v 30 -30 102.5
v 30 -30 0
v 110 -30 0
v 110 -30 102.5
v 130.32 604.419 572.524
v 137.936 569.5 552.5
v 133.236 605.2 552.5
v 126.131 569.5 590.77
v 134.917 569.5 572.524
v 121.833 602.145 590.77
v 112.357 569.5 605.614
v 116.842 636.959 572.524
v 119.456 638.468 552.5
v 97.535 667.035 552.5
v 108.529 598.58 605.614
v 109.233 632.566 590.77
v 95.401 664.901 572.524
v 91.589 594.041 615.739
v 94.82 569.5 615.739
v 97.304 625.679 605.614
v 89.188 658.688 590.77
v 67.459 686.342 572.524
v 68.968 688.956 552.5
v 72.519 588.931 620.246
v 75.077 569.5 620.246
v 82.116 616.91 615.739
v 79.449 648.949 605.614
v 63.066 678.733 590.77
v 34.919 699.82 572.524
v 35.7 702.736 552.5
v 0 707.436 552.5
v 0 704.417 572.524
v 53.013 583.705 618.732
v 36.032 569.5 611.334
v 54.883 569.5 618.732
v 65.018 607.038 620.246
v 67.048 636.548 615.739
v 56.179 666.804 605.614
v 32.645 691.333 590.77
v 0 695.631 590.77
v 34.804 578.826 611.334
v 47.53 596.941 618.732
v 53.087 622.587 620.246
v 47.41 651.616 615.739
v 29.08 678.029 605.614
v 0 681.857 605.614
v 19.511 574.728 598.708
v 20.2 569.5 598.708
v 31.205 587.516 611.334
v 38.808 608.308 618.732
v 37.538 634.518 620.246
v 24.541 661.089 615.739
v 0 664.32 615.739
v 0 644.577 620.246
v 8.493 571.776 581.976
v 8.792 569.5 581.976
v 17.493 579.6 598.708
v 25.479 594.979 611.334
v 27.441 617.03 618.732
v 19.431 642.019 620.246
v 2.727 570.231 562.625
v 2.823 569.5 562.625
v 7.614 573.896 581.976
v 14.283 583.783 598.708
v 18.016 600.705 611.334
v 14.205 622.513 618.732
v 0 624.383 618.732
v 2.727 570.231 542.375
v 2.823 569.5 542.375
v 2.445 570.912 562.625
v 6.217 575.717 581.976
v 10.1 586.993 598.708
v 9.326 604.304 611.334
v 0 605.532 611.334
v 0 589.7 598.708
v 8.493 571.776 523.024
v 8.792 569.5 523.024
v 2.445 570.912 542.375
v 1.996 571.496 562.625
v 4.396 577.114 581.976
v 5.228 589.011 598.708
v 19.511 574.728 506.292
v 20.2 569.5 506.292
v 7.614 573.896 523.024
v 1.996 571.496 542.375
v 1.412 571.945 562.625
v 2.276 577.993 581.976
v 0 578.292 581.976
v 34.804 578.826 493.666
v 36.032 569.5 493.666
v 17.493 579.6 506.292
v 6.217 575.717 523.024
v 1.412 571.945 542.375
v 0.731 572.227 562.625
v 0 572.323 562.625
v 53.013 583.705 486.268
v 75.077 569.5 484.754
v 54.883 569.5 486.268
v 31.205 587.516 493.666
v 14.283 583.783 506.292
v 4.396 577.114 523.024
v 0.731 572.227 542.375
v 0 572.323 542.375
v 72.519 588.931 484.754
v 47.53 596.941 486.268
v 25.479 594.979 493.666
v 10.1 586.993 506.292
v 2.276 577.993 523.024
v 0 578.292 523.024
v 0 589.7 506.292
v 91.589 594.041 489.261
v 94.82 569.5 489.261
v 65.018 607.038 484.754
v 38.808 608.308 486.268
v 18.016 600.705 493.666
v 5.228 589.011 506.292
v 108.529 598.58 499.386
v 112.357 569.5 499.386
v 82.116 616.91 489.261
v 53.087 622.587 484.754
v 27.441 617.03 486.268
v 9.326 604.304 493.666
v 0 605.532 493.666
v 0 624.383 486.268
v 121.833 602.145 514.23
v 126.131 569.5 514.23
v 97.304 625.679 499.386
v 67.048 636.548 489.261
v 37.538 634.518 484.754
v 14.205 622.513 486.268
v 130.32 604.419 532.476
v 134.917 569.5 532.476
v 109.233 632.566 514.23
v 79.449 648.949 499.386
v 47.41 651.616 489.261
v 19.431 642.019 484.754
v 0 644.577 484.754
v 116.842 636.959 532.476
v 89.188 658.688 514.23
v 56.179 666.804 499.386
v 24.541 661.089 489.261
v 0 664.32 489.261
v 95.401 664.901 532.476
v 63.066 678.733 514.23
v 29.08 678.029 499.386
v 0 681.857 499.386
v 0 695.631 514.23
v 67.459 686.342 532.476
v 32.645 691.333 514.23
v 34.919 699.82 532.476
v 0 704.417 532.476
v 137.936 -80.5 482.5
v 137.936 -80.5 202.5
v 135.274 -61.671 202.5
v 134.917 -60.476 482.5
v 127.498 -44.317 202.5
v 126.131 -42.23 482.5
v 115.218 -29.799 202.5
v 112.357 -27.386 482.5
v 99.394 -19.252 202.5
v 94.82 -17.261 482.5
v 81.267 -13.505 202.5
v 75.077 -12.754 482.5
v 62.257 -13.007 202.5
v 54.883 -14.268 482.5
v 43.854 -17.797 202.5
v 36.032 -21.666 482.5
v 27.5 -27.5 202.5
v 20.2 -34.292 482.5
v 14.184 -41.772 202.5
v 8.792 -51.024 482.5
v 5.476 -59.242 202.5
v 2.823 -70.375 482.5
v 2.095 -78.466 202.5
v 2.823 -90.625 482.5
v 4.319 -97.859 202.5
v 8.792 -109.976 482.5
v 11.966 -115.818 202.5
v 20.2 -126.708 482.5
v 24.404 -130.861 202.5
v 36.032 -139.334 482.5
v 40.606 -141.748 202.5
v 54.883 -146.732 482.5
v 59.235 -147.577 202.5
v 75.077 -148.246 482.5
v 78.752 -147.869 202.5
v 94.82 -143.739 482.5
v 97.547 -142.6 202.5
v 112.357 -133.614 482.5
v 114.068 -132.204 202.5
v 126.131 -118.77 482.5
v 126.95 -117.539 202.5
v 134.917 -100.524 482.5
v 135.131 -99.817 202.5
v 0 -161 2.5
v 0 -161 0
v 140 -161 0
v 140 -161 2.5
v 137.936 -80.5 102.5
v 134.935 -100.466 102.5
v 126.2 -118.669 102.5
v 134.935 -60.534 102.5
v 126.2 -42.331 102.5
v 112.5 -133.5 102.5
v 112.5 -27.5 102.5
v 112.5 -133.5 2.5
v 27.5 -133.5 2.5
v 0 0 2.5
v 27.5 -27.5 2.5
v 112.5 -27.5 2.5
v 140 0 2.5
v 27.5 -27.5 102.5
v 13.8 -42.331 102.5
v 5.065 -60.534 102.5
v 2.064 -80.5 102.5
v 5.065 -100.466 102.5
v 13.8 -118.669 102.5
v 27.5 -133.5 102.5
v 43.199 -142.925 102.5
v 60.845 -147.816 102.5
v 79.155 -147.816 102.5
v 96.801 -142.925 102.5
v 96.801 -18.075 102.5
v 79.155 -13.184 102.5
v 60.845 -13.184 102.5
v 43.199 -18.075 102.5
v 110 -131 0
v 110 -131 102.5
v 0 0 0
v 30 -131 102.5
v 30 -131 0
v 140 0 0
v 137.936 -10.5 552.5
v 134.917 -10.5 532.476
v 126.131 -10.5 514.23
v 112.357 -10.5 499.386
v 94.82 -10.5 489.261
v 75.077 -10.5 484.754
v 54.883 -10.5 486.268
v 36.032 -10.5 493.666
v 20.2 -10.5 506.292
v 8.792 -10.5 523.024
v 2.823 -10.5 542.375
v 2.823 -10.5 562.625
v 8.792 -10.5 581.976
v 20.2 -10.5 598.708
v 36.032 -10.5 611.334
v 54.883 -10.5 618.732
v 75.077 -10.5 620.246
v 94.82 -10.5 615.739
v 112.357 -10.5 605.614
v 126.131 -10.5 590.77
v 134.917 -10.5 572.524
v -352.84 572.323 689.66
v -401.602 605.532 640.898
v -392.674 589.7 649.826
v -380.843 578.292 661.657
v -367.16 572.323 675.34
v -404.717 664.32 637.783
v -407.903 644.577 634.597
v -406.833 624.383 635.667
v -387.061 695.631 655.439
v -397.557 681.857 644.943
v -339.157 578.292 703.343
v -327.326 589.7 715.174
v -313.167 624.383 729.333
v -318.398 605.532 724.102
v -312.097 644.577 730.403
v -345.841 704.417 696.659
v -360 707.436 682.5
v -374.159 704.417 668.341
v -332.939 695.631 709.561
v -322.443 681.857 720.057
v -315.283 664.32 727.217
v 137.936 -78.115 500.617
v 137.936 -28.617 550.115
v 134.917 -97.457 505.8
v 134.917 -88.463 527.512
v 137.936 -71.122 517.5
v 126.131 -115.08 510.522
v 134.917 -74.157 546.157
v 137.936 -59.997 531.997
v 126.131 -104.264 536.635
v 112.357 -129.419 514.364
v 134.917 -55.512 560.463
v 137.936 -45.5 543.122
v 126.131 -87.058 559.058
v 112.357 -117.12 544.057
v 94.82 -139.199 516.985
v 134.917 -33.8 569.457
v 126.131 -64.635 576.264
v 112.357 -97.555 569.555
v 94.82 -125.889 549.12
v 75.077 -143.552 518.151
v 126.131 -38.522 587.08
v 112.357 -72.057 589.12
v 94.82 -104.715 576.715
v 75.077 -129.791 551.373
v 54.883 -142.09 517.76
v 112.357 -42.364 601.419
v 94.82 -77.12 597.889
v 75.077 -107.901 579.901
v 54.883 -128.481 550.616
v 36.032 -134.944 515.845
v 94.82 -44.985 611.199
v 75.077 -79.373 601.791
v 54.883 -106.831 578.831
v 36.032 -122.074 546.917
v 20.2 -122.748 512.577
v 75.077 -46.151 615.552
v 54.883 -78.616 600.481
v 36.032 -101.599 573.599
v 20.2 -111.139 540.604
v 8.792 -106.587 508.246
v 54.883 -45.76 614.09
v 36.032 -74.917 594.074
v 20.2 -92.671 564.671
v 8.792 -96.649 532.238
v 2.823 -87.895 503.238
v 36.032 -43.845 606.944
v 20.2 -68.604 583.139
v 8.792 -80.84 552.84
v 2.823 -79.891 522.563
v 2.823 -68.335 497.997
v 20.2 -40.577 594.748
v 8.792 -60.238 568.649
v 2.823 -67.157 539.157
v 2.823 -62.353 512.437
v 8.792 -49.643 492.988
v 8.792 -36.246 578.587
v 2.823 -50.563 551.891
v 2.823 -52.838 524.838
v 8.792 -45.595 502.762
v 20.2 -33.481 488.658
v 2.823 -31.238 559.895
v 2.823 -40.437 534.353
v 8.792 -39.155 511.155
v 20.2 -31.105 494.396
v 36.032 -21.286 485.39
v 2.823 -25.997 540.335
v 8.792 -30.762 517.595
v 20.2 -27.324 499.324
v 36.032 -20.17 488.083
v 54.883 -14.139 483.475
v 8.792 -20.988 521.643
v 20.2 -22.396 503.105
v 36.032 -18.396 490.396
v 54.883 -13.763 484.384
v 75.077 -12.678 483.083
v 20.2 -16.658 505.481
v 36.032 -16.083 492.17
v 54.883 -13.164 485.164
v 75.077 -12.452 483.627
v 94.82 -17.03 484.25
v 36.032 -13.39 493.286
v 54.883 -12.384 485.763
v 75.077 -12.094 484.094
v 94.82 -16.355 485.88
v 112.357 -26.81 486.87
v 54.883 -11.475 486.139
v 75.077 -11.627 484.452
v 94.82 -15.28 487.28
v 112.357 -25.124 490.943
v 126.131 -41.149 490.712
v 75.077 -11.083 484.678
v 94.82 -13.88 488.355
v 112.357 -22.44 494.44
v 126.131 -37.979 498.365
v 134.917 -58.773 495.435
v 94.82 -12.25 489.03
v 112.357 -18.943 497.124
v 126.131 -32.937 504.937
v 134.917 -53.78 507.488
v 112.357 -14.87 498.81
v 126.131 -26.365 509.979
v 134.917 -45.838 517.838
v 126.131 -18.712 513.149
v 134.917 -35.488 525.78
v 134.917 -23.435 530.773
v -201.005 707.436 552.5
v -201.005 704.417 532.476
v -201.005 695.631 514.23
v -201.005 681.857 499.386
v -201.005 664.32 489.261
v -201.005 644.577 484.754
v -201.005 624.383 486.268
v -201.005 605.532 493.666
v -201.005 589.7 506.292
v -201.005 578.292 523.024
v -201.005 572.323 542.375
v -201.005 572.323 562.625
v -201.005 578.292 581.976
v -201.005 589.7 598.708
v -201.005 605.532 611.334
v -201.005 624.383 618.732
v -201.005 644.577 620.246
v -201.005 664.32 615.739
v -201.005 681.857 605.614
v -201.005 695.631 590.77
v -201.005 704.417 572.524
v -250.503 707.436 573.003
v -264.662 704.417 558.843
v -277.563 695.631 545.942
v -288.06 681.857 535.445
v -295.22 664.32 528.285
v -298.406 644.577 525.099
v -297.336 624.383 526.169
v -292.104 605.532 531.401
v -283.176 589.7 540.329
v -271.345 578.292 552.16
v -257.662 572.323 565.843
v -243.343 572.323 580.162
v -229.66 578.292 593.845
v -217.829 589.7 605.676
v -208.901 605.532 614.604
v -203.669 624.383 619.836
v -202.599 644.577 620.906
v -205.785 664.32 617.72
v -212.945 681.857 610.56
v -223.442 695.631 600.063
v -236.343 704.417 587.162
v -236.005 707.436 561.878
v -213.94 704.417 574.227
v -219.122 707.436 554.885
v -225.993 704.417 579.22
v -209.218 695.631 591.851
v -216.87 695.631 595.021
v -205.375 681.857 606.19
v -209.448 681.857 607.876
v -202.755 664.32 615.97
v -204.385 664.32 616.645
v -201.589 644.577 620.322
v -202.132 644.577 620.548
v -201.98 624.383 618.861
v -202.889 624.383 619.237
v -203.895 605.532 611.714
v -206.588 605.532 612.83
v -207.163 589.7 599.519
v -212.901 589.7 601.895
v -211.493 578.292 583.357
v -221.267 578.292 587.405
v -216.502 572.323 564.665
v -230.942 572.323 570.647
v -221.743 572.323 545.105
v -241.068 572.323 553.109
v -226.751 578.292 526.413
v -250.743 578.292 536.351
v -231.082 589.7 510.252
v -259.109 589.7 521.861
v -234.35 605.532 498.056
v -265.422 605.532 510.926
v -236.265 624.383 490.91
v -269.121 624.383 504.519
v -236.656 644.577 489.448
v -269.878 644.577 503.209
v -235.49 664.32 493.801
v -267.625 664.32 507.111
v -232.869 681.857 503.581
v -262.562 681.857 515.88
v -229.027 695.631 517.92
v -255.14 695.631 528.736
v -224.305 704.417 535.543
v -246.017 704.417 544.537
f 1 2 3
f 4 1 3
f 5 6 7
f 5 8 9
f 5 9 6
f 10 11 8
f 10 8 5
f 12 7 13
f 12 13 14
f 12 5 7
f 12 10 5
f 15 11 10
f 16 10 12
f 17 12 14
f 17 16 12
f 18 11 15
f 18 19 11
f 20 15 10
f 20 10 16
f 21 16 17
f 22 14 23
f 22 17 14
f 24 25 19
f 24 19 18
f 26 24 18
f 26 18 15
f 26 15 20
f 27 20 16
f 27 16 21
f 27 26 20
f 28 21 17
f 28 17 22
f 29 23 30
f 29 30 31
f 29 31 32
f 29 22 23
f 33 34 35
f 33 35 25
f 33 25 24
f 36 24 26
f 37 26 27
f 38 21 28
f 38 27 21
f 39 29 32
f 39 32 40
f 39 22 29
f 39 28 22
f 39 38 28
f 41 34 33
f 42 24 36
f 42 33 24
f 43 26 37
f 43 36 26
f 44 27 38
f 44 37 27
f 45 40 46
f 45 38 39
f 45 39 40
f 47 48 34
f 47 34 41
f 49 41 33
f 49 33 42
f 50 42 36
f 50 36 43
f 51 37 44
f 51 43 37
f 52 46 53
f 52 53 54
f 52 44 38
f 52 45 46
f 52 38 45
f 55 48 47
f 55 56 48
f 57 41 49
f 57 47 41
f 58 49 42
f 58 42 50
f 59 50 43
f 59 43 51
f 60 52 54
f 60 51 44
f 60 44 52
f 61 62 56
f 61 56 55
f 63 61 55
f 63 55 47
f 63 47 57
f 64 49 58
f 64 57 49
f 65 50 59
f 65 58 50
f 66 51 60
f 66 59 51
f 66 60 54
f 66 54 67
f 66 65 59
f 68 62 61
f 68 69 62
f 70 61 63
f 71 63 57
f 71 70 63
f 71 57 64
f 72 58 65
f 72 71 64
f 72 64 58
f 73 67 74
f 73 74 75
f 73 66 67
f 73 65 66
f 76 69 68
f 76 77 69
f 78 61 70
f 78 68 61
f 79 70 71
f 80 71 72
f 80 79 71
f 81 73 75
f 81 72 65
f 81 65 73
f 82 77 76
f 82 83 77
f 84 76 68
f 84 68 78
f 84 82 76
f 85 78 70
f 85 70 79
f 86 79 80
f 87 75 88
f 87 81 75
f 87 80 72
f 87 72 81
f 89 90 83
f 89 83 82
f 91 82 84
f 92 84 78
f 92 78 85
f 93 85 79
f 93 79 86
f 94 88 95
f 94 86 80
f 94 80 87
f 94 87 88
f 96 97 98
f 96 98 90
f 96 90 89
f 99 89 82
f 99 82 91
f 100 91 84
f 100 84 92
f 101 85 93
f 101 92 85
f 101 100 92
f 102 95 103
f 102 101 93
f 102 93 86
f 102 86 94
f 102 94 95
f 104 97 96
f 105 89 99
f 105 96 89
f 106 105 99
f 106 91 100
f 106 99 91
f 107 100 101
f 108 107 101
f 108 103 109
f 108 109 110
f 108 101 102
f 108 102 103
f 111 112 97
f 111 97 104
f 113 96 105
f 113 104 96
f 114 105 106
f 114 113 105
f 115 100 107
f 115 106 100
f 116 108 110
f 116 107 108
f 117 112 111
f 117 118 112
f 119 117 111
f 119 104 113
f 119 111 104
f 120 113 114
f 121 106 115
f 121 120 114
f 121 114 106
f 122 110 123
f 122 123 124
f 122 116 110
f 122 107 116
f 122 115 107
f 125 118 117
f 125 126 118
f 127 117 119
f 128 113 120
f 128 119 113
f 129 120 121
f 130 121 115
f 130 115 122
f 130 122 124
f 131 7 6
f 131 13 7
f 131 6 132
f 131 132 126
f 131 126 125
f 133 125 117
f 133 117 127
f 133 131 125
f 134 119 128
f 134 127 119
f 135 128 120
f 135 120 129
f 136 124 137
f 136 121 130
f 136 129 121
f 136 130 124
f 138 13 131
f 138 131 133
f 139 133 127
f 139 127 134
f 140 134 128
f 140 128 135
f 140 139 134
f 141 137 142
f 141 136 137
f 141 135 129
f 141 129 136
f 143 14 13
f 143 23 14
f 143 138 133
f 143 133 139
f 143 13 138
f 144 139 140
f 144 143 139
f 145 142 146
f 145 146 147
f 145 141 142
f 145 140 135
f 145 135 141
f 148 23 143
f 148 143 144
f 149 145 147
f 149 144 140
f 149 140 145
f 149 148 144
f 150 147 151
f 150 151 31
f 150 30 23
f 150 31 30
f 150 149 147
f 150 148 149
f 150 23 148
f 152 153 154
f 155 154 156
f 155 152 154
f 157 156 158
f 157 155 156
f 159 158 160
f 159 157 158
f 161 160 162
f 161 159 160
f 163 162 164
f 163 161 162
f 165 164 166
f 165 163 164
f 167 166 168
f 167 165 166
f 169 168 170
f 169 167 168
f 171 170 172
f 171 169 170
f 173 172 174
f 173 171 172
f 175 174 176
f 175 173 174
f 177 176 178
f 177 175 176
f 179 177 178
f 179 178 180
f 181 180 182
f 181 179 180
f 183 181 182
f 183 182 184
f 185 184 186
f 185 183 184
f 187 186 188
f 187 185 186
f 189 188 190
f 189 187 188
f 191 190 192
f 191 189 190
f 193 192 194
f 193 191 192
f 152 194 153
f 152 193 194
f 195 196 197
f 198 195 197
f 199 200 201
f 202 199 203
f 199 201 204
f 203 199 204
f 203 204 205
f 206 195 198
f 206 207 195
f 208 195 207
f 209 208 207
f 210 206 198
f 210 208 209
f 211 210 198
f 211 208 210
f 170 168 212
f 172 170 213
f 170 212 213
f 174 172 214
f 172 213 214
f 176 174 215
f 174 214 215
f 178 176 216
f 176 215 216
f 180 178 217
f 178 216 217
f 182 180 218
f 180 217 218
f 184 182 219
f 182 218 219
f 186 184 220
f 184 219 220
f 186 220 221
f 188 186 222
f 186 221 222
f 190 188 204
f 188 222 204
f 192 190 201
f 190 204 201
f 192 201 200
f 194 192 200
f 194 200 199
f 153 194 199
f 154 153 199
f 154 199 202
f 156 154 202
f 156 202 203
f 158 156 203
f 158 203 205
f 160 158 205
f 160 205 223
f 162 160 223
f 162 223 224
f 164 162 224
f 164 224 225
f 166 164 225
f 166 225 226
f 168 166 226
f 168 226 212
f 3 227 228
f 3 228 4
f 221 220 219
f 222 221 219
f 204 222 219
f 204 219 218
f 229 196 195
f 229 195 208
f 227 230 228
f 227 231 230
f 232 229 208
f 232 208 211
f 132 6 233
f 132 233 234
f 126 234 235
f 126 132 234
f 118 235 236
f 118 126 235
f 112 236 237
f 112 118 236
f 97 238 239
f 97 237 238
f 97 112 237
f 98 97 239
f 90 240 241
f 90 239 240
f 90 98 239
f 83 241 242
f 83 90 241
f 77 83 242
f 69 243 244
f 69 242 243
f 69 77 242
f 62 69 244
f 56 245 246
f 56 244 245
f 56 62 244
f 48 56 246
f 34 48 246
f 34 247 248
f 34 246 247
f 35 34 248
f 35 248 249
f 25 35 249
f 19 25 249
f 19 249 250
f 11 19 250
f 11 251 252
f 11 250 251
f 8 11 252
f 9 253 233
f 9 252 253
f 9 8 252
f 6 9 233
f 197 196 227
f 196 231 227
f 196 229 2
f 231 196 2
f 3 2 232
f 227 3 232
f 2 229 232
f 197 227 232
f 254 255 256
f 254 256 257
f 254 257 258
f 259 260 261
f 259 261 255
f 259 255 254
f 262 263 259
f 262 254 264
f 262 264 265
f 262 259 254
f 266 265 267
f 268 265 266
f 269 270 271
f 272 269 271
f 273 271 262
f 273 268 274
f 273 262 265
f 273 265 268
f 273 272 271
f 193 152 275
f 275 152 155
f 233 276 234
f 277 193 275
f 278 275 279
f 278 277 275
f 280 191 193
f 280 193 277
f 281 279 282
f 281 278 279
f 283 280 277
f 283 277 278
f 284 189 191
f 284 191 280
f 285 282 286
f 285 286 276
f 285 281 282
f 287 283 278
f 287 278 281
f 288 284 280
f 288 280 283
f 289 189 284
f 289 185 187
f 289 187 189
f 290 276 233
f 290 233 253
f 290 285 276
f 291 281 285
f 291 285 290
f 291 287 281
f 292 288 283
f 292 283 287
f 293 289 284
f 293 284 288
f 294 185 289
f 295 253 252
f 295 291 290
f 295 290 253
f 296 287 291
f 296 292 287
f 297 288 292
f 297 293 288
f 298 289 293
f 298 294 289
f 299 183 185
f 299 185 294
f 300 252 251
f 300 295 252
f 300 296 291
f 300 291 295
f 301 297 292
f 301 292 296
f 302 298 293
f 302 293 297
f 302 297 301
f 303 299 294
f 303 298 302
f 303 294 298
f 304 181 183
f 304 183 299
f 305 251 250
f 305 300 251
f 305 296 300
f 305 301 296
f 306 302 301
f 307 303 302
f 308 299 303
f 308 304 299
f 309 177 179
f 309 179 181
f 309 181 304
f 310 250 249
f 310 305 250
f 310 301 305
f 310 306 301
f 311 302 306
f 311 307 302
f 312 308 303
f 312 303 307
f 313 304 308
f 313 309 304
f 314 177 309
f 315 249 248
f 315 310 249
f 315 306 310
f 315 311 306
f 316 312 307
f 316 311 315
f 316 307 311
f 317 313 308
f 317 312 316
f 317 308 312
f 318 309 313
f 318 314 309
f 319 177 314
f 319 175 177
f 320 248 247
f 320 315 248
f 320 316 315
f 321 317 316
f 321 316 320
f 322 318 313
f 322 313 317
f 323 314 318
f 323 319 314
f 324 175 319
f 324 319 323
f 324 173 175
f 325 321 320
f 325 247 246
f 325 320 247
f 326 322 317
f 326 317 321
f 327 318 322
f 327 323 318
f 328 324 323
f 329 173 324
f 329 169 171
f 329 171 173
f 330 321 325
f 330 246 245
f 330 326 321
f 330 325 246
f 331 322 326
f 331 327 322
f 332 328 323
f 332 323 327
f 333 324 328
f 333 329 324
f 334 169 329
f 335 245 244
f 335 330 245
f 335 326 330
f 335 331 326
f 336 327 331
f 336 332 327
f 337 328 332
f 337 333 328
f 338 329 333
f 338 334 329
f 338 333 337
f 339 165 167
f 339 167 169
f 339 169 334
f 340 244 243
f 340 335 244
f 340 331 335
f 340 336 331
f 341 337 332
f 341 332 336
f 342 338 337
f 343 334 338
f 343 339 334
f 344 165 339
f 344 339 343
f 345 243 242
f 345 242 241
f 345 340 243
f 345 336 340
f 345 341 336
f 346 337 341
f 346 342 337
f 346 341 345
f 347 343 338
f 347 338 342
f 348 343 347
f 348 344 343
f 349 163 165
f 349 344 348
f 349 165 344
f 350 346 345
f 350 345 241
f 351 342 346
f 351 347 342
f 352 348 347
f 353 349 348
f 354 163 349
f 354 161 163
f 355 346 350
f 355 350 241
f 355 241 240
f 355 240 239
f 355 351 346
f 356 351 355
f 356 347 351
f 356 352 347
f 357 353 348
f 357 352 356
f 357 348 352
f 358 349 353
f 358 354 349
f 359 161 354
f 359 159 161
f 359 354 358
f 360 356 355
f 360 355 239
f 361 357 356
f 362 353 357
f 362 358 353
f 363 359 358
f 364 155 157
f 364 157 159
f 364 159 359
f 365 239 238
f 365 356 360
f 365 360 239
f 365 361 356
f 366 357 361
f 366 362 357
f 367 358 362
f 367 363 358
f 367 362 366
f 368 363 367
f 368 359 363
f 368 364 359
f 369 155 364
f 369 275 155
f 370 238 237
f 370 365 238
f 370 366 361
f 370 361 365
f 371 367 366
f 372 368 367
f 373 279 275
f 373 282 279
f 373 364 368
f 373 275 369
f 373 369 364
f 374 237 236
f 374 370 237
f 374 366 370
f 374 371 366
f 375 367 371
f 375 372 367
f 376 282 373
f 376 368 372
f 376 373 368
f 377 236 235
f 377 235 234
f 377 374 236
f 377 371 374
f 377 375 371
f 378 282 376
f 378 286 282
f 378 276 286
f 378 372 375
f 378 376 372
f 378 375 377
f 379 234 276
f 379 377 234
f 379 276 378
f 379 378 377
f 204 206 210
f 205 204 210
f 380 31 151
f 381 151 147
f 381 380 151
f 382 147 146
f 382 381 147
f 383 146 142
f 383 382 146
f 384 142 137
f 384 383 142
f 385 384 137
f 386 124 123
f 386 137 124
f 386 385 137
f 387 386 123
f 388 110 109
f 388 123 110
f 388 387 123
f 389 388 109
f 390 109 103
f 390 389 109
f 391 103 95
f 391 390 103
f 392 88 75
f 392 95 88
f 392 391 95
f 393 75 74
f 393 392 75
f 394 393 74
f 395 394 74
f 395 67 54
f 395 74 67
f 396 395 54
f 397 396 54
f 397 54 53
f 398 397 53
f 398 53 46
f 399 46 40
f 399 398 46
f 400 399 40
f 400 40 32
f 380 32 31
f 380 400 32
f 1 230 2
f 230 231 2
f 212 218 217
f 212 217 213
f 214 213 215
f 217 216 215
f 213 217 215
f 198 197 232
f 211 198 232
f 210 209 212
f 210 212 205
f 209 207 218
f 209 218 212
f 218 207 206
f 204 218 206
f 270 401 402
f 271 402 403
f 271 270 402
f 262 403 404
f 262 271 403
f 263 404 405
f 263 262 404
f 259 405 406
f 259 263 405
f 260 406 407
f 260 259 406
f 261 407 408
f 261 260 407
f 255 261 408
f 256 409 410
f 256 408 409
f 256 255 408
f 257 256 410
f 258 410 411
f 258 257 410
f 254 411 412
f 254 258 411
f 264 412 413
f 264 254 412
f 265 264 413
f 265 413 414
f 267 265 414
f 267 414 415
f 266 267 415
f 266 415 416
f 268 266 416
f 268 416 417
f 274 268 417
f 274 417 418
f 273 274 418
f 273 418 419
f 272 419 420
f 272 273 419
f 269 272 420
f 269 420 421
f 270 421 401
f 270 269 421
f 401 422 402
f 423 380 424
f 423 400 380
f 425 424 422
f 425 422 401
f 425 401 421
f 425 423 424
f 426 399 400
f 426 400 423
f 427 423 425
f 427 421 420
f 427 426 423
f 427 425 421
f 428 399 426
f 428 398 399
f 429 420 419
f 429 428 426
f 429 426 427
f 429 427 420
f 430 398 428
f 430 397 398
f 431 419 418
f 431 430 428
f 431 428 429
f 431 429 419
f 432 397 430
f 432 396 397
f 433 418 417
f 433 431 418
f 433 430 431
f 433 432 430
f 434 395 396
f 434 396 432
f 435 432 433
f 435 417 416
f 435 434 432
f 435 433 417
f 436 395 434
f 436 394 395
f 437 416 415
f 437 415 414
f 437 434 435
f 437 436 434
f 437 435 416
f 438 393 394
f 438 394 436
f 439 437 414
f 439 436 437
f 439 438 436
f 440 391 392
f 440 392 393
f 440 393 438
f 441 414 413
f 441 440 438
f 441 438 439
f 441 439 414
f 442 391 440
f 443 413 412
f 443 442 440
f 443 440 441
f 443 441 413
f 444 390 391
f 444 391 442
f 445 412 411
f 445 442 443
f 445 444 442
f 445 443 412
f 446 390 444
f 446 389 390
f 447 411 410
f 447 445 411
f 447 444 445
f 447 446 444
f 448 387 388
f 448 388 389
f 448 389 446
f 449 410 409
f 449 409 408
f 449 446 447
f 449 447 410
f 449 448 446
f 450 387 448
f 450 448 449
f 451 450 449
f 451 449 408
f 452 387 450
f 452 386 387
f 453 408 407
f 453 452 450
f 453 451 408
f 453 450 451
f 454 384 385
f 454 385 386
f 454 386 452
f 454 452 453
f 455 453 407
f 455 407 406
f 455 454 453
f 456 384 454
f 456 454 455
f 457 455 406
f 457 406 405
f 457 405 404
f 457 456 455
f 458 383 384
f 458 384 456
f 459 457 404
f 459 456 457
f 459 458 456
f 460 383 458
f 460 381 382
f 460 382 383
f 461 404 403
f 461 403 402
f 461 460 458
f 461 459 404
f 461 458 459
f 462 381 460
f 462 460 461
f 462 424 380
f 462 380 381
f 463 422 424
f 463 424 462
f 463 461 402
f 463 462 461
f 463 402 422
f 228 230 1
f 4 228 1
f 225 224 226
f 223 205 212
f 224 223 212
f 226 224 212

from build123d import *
from build123d.topology import SkipClean

# Parameters (mm, degrees)
CROQUIS1_W              = 140
CROQUIS1_H              = 161
CROQUIS1_W_2            = 80
CROQUIS1_H_2            = 101
SALIENTE_EXTRUIR1_DEPTH = 2.5
CROQUIS2_W              = 85
CROQUIS2_H              = 106
CROQUIS2_W_2            = 80
CROQUIS2_H_2            = 101
SALIENTE_EXTRUIR2_DEPTH = 100
CROQUIS3_R              = 67.935631299
SALIENTE_EXTRUIR3_DEPTH = 100
CROQUIS4_R              = 67.935631299


with BuildPart() as part:
    # Croquis1 → Saliente-Extruir1 (new body)
    with BuildSketch(Plane.XY):
        with Locations((70, -80.5)):
            Rectangle(CROQUIS1_W, CROQUIS1_H)
        with Locations((70, -80.5)):
            Rectangle(CROQUIS1_W_2, CROQUIS1_H_2, mode=Mode.SUBTRACT)
    extrude(amount=SALIENTE_EXTRUIR1_DEPTH)

    # Croquis2 → Saliente-Extruir2 (add)
    with BuildSketch(Plane.XY.offset(2.5)):
        with Locations((70, -80.5)):
            Rectangle(CROQUIS2_W, CROQUIS2_H)
        with Locations((70, -80.5)):
            Rectangle(CROQUIS2_W_2, CROQUIS2_H_2, mode=Mode.SUBTRACT)
    extrude(amount=SALIENTE_EXTRUIR2_DEPTH)

    # Croquis3 → Saliente-Extruir3 (add)
    with BuildSketch(Plane.XY.offset(102.5)):
        with Locations(Location((70, -80.5, 0), (0, 0, 128.725665443))):
            Circle(CROQUIS3_R)
    extrude(amount=SALIENTE_EXTRUIR3_DEPTH)

    # Barrer1: sweep along a curve in space
    with SkipClean():  # the faces are left unmerged after this step: merging them gives an invalid solid
        with BuildLine() as barrer1_path:
            Line((70, -80.5, 202.5), (70, -80.5, 482.5))
            ThreePointArc((70, -80.5, 482.5), (70, -59.997474683, 531.997474683), (70, -10.5, 552.5))
            Line((70, -10.5, 552.5), (70, 569.5, 552.5))
            ThreePointArc((70, 569.5, 552.5), (49.497474683, 618.997474683, 552.5), (0, 639.5, 552.5))
            Line((0, 639.5, 552.5), (-201.005050634, 639.5, 552.5))
            ThreePointArc((-201.005050634, 639.5, 552.5), (-227.792890899, 639.5, 557.828432724), (-250.502525317, 639.5, 573.002525317))
            Line((-360, 639.5, 682.5), (-250.502525317, 639.5, 573.002525317))
        # Croquis4 → Barrer1 (sweep)
        with BuildSketch(Plane.XY.offset(202.5)):
            with Locations((70, -80.5)):
                Circle(CROQUIS4_R)
        sweep(path=barrer1_path.line)


solid = part.part
